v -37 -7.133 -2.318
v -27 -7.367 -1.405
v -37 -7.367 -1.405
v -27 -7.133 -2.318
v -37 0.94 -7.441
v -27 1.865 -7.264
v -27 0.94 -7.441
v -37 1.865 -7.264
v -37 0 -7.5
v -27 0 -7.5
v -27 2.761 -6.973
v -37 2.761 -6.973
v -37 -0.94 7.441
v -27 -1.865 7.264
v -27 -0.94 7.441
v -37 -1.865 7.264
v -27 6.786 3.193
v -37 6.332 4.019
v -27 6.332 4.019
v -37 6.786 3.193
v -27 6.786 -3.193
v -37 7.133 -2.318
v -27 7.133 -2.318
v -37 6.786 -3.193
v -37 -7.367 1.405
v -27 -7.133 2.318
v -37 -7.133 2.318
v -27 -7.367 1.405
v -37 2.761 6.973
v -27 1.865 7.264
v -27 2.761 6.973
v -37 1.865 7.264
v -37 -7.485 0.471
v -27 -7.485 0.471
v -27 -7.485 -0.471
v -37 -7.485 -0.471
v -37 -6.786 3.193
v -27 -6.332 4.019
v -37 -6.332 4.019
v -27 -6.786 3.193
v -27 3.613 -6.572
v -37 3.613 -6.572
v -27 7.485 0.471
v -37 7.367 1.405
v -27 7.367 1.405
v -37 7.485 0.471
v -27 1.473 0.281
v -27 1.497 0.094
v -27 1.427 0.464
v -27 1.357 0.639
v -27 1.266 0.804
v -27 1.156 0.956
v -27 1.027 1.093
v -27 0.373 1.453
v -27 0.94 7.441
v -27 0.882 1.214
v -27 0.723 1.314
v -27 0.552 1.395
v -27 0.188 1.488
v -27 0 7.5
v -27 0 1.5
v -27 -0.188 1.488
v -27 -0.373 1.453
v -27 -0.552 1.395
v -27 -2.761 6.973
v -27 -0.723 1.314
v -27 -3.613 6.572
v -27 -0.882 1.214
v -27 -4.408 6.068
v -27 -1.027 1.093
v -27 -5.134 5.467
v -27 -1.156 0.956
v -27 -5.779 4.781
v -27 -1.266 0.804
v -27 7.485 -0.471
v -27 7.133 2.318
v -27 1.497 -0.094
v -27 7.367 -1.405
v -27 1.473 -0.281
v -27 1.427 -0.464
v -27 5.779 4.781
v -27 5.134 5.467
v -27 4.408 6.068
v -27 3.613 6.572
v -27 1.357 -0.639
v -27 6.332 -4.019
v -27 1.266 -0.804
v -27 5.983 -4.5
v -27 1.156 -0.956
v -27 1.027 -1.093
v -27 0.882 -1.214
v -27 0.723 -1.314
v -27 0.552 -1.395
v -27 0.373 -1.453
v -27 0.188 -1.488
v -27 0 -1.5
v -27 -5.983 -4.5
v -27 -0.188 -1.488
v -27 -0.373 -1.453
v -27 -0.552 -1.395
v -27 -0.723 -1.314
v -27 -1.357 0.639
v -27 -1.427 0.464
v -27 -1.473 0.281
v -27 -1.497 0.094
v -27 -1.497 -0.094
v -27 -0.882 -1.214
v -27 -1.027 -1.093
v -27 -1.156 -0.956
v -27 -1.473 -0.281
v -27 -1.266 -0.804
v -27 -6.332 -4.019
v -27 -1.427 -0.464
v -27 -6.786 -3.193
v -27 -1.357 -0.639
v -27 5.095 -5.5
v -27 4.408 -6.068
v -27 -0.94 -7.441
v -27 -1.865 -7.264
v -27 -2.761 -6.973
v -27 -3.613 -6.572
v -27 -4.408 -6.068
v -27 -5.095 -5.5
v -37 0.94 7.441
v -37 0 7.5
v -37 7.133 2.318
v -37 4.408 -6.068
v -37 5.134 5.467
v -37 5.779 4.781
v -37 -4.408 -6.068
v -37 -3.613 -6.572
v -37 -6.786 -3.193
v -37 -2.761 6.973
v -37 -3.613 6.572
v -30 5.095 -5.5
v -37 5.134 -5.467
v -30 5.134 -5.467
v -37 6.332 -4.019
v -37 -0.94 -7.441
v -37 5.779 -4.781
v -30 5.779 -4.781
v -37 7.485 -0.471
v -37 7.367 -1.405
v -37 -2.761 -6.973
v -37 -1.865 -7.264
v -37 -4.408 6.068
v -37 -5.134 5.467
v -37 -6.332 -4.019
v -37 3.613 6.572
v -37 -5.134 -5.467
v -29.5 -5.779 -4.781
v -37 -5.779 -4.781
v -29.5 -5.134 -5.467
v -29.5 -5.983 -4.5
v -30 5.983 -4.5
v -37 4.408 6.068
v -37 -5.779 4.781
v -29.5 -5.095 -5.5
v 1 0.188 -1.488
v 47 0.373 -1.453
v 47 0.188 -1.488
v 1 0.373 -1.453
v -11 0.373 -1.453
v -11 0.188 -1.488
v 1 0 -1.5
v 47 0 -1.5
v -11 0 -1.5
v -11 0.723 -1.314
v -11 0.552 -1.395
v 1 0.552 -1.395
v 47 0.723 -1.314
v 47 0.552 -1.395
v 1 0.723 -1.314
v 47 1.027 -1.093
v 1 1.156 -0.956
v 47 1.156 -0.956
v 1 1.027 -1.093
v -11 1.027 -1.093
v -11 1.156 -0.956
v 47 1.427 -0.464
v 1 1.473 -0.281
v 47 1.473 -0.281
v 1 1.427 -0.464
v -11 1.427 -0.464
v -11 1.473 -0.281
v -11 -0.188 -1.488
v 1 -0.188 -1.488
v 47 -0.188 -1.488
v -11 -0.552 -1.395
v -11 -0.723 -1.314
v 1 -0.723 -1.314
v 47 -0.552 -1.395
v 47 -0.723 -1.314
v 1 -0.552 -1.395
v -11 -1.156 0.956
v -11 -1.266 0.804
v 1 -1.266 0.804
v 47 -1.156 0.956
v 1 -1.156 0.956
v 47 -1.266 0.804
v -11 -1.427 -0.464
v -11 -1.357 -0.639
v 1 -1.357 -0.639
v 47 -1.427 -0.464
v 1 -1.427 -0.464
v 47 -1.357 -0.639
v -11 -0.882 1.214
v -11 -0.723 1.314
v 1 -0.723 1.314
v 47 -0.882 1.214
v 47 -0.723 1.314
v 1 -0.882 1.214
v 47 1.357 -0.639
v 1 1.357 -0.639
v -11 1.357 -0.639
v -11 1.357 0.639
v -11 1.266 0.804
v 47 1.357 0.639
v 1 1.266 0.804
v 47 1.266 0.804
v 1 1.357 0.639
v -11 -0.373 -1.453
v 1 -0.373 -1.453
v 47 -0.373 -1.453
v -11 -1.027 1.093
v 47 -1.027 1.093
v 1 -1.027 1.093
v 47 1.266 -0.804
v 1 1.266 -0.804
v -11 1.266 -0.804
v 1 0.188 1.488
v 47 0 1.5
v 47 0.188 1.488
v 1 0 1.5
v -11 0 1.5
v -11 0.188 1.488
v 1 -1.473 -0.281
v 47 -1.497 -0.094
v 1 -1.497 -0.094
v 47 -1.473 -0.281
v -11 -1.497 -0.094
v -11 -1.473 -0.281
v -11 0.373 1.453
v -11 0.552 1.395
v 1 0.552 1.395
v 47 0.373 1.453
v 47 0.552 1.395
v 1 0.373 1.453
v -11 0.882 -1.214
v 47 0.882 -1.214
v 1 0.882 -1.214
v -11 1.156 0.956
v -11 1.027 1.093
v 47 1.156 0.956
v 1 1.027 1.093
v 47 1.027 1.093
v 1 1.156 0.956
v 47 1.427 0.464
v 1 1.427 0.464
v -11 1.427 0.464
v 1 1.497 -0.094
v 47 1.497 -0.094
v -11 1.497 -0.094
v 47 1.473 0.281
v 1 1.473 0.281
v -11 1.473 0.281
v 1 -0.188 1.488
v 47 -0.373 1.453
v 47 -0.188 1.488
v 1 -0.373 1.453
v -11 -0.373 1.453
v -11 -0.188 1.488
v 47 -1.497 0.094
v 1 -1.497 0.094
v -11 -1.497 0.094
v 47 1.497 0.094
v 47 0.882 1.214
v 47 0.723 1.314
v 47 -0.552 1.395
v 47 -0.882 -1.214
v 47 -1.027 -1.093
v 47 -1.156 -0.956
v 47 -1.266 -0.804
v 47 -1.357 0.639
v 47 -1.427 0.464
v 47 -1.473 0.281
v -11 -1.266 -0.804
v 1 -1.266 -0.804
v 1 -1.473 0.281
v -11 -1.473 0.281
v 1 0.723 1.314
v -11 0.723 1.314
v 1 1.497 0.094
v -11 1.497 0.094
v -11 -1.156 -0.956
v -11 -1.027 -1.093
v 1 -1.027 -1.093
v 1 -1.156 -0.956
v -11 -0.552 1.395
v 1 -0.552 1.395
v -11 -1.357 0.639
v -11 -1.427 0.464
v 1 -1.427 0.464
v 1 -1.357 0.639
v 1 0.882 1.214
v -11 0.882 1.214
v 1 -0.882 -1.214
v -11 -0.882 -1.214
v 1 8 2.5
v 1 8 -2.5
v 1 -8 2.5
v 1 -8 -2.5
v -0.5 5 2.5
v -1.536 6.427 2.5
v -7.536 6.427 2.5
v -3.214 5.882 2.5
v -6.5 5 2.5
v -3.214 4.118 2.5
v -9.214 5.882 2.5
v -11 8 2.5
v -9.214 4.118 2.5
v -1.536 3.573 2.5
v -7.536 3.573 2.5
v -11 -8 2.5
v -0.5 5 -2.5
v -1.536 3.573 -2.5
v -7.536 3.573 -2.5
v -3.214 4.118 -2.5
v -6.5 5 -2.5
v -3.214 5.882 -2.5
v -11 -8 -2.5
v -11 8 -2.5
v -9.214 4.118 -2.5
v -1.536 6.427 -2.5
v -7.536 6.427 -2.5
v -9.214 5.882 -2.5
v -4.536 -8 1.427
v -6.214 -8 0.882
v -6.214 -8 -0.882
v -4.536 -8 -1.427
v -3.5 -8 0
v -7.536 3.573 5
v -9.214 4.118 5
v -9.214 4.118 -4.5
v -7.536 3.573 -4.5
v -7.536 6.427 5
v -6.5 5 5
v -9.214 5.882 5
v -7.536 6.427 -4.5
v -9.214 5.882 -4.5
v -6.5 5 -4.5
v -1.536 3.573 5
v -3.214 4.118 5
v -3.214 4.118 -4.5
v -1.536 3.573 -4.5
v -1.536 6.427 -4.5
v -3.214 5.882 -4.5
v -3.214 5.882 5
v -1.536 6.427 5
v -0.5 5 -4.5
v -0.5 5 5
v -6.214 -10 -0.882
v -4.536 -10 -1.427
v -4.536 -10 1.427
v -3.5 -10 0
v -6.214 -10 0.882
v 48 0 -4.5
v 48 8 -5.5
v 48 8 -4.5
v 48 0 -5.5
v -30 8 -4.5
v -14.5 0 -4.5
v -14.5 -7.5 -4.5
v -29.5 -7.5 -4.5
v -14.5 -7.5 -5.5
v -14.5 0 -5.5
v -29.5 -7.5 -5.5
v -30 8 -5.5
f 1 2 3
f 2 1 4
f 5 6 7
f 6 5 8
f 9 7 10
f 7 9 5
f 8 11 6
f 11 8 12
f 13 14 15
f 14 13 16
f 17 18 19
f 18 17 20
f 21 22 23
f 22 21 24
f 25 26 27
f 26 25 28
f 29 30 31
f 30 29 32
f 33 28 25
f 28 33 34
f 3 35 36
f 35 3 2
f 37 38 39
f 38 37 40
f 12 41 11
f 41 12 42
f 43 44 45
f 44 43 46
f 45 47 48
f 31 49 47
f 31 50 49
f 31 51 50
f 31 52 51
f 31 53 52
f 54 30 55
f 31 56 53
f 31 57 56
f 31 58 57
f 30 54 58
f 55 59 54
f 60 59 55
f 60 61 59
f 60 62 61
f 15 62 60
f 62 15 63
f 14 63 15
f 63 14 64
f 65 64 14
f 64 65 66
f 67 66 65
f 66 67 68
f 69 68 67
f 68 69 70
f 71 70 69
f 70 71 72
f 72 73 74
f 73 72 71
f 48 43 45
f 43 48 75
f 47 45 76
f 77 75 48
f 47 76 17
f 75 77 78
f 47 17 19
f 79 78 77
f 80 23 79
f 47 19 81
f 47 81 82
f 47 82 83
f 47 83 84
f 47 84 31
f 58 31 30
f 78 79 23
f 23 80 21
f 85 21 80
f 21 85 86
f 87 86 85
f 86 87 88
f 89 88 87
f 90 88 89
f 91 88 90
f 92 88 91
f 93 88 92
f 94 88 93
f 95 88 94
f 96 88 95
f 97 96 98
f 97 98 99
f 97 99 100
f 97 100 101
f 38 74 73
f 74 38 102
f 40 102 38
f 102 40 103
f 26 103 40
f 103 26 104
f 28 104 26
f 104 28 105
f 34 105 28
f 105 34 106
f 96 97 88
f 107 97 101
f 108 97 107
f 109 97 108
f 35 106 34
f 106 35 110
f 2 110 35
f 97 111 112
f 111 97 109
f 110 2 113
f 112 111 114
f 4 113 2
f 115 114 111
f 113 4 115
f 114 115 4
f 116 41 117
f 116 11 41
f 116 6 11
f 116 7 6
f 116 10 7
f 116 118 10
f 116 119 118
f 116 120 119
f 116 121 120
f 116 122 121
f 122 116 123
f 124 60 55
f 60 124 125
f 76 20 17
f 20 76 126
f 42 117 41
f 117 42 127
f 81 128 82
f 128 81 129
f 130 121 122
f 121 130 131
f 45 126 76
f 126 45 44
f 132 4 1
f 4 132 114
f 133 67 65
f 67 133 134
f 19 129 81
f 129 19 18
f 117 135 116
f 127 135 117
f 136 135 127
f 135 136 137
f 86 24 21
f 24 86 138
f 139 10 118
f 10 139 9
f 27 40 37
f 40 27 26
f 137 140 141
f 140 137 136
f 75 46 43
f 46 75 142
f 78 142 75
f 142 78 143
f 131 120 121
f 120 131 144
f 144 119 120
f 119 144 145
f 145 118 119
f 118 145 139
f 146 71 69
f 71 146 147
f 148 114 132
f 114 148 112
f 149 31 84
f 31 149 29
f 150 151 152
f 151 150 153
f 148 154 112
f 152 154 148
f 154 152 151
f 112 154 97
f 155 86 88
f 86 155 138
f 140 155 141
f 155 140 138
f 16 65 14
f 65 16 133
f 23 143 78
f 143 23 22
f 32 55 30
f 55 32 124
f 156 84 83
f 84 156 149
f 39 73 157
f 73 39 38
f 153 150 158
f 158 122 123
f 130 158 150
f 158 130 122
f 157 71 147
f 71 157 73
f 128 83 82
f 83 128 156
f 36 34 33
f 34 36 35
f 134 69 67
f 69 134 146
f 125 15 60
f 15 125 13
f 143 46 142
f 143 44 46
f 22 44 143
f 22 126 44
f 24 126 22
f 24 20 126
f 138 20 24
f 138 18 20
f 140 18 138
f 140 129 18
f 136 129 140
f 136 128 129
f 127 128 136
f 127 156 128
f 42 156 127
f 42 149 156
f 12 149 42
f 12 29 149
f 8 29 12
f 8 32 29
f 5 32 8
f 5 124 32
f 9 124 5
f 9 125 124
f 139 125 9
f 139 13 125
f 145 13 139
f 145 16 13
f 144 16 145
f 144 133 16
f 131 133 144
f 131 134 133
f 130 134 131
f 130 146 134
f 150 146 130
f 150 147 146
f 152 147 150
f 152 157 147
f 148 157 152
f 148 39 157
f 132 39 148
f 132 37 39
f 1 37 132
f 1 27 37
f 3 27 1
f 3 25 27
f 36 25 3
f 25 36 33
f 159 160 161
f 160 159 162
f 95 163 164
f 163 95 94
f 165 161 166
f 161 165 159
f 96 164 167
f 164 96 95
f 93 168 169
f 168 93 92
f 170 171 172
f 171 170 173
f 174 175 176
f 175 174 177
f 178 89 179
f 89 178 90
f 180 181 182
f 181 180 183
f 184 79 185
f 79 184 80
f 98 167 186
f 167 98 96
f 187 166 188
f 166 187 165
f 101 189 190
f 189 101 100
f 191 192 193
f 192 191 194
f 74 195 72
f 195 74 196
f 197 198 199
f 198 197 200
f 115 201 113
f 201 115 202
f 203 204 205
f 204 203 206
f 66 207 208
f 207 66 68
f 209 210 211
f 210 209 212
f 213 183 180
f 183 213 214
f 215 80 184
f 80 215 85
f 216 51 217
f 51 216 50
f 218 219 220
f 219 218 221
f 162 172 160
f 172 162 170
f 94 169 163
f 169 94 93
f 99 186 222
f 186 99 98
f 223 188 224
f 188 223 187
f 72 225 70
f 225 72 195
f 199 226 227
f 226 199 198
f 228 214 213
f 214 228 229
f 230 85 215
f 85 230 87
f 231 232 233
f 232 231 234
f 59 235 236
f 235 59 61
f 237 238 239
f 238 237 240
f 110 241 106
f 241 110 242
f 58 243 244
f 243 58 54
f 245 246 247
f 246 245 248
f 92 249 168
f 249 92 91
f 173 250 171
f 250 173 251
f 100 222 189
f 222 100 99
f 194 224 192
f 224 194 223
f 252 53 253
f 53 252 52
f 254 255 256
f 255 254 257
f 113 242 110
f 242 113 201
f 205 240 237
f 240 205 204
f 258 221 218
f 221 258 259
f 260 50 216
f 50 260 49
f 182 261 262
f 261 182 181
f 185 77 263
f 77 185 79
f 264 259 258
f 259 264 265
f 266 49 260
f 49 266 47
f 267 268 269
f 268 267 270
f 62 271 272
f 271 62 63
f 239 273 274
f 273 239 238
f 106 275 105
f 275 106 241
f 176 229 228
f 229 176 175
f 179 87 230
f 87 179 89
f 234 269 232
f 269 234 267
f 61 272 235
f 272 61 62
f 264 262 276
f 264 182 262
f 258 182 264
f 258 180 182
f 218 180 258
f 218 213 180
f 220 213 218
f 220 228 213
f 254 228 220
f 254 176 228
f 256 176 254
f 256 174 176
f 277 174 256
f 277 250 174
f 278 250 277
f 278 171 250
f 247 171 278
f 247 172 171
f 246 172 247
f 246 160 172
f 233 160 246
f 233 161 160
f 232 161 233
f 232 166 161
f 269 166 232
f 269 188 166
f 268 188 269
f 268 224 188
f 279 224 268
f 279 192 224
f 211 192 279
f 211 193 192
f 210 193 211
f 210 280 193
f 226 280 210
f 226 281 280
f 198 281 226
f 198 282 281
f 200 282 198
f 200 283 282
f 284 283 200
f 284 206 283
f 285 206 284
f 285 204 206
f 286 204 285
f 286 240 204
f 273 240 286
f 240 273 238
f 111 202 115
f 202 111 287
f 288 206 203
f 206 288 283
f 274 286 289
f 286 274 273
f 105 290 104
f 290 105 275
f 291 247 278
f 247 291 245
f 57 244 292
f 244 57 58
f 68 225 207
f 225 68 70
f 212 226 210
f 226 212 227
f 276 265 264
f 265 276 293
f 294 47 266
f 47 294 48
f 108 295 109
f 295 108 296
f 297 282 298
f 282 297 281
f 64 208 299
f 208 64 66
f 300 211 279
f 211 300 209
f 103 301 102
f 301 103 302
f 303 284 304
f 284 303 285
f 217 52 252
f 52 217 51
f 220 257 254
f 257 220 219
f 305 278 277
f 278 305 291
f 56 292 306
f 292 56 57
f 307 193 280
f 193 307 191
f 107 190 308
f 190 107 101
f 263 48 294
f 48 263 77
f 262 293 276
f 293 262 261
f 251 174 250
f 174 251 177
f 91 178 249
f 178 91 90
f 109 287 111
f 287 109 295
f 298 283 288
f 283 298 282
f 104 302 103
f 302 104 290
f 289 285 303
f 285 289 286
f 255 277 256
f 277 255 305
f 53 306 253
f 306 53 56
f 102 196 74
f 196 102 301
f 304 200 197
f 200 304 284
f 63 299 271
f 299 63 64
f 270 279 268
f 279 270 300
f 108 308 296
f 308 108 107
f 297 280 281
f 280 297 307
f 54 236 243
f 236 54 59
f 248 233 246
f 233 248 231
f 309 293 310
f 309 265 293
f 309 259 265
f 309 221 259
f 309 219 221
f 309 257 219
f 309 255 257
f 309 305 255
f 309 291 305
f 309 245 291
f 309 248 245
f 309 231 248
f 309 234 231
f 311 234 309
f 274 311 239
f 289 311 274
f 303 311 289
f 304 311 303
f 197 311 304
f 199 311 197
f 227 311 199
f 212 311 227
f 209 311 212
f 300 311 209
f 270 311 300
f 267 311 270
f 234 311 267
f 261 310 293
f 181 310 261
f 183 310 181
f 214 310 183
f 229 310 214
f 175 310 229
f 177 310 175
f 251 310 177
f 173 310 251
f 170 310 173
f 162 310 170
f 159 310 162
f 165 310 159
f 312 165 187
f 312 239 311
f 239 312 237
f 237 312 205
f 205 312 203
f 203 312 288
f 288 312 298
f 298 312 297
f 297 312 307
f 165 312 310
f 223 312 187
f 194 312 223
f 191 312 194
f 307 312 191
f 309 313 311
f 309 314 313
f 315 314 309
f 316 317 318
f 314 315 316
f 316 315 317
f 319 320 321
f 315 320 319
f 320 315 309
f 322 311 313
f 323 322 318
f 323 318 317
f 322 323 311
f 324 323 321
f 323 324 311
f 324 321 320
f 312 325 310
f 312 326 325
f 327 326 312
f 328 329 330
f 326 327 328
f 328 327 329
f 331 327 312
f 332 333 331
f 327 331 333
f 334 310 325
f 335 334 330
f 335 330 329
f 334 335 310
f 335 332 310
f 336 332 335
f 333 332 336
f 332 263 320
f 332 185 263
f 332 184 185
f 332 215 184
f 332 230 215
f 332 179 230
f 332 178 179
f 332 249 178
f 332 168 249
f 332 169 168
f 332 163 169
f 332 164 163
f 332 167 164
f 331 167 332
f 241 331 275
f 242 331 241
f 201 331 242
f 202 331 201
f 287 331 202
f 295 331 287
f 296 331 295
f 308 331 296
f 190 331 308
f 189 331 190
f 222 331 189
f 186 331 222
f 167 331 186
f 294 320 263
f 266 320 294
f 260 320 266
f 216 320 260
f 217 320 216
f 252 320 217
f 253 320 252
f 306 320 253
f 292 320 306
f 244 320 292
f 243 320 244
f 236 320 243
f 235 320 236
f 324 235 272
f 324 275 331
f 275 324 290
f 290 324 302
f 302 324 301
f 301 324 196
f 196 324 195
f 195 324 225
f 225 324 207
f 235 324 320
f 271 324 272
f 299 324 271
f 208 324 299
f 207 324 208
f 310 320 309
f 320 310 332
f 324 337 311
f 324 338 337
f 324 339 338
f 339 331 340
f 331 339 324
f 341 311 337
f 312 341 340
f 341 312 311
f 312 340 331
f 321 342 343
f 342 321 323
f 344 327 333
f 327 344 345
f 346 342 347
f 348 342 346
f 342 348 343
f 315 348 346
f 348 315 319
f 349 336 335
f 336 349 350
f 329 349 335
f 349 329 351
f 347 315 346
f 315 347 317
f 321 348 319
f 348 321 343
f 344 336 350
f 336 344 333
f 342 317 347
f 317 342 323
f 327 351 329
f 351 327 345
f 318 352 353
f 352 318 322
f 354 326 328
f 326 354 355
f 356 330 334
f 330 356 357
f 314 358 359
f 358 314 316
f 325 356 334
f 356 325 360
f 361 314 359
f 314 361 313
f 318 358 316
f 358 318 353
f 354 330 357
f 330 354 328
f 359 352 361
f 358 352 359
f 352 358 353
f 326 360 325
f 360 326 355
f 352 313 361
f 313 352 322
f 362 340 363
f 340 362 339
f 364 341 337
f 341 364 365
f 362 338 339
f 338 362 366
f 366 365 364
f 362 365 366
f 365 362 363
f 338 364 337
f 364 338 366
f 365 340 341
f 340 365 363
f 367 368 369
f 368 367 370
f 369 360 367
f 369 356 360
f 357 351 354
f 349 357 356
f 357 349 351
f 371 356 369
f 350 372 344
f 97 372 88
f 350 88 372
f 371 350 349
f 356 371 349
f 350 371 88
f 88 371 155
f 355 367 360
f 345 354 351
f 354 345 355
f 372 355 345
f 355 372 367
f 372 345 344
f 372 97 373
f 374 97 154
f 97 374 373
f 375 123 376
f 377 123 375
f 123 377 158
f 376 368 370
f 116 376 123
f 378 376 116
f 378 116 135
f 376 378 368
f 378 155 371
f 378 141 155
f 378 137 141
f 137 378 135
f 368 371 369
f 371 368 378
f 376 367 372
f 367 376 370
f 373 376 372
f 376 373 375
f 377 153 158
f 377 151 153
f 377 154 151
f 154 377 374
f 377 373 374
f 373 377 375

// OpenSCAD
module slideStepper(driveBlockPos){
	driveBlockPos= driveBlockPos - 25;
	rotate([0,90,0]){
		translate([0,0,-32]){
			//motor
			color([0.7,0.7,0.9]) cylinder(r=7.5,h=10,$fn=50,center=true);
		}
		translate([0,0,10]){
			//shaft
			color([0.6,0.6,0.9]) cylinder(r=1.5,h=74,$fn=50,center=true);
		}
	}
	//basePlate
	translate([9,4,-5]){
		cube(size=[78,8,1],center=true);
	}
	translate([-22,0,-5]){
		cube(size=[15,15,1],center=true);
	}
	translate([driveBlockPos,0,0]){
		//driveBlock
		color([0.9,0.9,0.7]) cube(size=[12,16,5],center=true);
		//driveBlockScrews
		translate([-3,5,0]){
			cylinder(r=1.5,h=10,center=true);
		}
		translate([3,5,0]){
			cylinder(r=1.5,h=10,center=true);
		}
		translate([0,-5,0]){
			rotate([90,0,0]){
				cylinder(r=1.5,h=10,center=true);
			}
		}
	}	
}

slideStepper(20);
